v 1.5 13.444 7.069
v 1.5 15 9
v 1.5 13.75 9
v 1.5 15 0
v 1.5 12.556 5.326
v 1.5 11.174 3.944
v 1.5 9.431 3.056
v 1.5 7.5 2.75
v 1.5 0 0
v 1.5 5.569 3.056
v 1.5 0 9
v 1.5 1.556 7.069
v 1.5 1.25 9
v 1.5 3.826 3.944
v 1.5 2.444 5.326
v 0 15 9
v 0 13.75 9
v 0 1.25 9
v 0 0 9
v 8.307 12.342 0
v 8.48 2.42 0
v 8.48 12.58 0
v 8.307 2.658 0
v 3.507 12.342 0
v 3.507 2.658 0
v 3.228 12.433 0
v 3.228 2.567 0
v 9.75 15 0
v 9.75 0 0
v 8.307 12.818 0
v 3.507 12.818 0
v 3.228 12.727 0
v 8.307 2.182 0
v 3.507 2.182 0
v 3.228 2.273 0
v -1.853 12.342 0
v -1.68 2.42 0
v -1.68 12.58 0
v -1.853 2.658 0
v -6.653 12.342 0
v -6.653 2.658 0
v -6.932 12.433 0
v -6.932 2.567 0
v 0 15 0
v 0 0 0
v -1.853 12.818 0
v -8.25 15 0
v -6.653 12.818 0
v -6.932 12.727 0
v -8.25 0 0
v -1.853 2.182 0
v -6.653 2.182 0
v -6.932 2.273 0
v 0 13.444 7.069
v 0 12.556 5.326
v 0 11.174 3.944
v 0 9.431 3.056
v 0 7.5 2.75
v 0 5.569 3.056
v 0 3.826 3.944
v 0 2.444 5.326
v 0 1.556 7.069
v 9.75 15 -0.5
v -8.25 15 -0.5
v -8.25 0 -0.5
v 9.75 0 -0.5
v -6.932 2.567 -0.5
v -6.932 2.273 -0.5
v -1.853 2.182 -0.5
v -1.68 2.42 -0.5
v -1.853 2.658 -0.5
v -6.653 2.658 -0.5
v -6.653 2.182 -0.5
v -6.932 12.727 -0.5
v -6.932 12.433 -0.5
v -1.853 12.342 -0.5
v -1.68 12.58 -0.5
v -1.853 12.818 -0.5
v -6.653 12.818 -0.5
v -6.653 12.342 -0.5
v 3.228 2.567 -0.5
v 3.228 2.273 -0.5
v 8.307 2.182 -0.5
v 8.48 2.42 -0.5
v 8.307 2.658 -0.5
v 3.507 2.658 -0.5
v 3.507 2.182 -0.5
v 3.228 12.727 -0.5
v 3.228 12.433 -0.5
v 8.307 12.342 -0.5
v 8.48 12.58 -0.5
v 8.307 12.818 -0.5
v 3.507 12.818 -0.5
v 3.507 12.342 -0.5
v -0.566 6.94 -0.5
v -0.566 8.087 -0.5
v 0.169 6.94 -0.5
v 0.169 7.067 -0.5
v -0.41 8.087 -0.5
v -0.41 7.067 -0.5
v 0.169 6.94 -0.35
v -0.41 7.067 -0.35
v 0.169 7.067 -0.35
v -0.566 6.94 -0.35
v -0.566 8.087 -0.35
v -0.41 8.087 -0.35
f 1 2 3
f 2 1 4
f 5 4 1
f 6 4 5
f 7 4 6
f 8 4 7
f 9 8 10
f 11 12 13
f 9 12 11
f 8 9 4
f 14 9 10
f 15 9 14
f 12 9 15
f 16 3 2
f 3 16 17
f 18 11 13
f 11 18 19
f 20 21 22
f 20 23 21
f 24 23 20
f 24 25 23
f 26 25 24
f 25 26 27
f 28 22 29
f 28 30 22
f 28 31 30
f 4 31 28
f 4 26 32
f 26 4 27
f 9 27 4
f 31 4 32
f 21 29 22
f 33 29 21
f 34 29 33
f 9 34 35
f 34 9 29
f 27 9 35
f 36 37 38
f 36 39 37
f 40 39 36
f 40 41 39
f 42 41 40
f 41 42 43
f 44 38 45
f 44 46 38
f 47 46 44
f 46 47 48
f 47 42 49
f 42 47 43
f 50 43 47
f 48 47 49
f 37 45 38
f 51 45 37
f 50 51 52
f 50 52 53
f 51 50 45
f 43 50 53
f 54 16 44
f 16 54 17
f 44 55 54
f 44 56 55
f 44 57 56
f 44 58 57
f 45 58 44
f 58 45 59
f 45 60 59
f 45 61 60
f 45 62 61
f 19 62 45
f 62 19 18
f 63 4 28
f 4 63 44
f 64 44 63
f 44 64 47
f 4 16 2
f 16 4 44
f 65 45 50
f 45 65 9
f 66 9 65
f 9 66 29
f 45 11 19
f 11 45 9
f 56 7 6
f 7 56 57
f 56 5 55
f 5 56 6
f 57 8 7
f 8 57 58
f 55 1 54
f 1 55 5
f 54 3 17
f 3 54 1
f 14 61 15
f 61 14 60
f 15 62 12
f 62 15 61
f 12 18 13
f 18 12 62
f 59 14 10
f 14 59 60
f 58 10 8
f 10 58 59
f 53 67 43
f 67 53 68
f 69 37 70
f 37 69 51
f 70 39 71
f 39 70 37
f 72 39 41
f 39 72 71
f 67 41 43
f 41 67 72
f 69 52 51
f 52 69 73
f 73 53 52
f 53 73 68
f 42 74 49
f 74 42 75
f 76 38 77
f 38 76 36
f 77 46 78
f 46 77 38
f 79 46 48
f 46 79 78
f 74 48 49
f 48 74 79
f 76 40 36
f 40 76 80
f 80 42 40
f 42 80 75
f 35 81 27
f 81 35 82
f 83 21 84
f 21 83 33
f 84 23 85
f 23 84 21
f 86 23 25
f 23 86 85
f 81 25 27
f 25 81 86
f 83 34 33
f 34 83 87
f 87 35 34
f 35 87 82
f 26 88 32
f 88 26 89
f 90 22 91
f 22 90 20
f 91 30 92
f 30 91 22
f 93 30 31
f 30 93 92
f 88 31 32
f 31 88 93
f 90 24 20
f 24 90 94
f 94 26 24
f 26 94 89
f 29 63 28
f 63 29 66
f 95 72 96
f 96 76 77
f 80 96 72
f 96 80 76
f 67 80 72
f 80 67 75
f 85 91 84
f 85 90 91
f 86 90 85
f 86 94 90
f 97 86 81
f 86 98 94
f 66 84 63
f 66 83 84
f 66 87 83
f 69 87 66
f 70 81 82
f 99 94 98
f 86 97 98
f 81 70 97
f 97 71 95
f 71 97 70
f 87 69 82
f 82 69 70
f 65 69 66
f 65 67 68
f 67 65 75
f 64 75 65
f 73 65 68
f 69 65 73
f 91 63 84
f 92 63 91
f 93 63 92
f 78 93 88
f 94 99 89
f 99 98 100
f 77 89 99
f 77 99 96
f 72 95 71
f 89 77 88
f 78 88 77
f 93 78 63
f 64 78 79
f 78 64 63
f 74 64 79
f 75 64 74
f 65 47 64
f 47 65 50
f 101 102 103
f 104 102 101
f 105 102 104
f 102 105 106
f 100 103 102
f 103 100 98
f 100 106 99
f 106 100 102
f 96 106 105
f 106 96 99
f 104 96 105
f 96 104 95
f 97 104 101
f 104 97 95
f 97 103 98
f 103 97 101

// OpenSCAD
clamp_width = 15;         
clamp_thickness = 1.5;      
clamp_height = 9;         
cylinder_diameter = 12.5; 
base_length = 18;         
base_thickness = 0.5;     
hole_diameter = 0.4;      
mount_hole_diameter = 0.5;
mount_hole_offset = 5.08; 
mount_hole_length = 4.8; 
mount_hole_width = 0.5;   

module end_clamp_with_half_base() {
    difference() {
        
        cube([clamp_thickness, clamp_width, clamp_height]);
        
       
        translate([clamp_thickness/2, clamp_width/2, clamp_height])
        rotate([0, 90, 0])
        cylinder(h = clamp_thickness, d = cylinder_diameter, center=true);
        
        
        for (y = [-hole_diameter, hole_diameter]) {
            translate([clamp_thickness/2, y + clamp_width/2, clamp_height/2])
            rotate([0, 90, 0])
            cylinder(h = clamp_thickness + 0.2, d = hole_diameter);
        }
    }
    
    
    translate([-base_length/2 + clamp_thickness/2, 0, -base_thickness])
    difference() {
        cube([base_length, clamp_width, base_thickness]);
        
        
        for (x = [-mount_hole_offset, mount_hole_offset]) {
            for (y = [-mount_hole_offset, mount_hole_offset]) {
                translate([x + base_length/2, y + clamp_width/2, -0.01])
                hull() {
                    translate([-mount_hole_length/2, 0, 0])
                    cylinder(h = base_thickness + 0.02, d = mount_hole_width);
                    
                    translate([mount_hole_length/2, 0, 0])
                    cylinder(h = base_thickness + 0.02, d = mount_hole_width);
                }
            }
        }

        
        translate([base_length/2 - 1, clamp_width/2, -0.15])
        linear_extrude(height = 0.3)
        text("L", size = 1.2, valign = "center", halign = "center");
    }
}


translate([0, 0, 0]) end_clamp_with_half_base();
